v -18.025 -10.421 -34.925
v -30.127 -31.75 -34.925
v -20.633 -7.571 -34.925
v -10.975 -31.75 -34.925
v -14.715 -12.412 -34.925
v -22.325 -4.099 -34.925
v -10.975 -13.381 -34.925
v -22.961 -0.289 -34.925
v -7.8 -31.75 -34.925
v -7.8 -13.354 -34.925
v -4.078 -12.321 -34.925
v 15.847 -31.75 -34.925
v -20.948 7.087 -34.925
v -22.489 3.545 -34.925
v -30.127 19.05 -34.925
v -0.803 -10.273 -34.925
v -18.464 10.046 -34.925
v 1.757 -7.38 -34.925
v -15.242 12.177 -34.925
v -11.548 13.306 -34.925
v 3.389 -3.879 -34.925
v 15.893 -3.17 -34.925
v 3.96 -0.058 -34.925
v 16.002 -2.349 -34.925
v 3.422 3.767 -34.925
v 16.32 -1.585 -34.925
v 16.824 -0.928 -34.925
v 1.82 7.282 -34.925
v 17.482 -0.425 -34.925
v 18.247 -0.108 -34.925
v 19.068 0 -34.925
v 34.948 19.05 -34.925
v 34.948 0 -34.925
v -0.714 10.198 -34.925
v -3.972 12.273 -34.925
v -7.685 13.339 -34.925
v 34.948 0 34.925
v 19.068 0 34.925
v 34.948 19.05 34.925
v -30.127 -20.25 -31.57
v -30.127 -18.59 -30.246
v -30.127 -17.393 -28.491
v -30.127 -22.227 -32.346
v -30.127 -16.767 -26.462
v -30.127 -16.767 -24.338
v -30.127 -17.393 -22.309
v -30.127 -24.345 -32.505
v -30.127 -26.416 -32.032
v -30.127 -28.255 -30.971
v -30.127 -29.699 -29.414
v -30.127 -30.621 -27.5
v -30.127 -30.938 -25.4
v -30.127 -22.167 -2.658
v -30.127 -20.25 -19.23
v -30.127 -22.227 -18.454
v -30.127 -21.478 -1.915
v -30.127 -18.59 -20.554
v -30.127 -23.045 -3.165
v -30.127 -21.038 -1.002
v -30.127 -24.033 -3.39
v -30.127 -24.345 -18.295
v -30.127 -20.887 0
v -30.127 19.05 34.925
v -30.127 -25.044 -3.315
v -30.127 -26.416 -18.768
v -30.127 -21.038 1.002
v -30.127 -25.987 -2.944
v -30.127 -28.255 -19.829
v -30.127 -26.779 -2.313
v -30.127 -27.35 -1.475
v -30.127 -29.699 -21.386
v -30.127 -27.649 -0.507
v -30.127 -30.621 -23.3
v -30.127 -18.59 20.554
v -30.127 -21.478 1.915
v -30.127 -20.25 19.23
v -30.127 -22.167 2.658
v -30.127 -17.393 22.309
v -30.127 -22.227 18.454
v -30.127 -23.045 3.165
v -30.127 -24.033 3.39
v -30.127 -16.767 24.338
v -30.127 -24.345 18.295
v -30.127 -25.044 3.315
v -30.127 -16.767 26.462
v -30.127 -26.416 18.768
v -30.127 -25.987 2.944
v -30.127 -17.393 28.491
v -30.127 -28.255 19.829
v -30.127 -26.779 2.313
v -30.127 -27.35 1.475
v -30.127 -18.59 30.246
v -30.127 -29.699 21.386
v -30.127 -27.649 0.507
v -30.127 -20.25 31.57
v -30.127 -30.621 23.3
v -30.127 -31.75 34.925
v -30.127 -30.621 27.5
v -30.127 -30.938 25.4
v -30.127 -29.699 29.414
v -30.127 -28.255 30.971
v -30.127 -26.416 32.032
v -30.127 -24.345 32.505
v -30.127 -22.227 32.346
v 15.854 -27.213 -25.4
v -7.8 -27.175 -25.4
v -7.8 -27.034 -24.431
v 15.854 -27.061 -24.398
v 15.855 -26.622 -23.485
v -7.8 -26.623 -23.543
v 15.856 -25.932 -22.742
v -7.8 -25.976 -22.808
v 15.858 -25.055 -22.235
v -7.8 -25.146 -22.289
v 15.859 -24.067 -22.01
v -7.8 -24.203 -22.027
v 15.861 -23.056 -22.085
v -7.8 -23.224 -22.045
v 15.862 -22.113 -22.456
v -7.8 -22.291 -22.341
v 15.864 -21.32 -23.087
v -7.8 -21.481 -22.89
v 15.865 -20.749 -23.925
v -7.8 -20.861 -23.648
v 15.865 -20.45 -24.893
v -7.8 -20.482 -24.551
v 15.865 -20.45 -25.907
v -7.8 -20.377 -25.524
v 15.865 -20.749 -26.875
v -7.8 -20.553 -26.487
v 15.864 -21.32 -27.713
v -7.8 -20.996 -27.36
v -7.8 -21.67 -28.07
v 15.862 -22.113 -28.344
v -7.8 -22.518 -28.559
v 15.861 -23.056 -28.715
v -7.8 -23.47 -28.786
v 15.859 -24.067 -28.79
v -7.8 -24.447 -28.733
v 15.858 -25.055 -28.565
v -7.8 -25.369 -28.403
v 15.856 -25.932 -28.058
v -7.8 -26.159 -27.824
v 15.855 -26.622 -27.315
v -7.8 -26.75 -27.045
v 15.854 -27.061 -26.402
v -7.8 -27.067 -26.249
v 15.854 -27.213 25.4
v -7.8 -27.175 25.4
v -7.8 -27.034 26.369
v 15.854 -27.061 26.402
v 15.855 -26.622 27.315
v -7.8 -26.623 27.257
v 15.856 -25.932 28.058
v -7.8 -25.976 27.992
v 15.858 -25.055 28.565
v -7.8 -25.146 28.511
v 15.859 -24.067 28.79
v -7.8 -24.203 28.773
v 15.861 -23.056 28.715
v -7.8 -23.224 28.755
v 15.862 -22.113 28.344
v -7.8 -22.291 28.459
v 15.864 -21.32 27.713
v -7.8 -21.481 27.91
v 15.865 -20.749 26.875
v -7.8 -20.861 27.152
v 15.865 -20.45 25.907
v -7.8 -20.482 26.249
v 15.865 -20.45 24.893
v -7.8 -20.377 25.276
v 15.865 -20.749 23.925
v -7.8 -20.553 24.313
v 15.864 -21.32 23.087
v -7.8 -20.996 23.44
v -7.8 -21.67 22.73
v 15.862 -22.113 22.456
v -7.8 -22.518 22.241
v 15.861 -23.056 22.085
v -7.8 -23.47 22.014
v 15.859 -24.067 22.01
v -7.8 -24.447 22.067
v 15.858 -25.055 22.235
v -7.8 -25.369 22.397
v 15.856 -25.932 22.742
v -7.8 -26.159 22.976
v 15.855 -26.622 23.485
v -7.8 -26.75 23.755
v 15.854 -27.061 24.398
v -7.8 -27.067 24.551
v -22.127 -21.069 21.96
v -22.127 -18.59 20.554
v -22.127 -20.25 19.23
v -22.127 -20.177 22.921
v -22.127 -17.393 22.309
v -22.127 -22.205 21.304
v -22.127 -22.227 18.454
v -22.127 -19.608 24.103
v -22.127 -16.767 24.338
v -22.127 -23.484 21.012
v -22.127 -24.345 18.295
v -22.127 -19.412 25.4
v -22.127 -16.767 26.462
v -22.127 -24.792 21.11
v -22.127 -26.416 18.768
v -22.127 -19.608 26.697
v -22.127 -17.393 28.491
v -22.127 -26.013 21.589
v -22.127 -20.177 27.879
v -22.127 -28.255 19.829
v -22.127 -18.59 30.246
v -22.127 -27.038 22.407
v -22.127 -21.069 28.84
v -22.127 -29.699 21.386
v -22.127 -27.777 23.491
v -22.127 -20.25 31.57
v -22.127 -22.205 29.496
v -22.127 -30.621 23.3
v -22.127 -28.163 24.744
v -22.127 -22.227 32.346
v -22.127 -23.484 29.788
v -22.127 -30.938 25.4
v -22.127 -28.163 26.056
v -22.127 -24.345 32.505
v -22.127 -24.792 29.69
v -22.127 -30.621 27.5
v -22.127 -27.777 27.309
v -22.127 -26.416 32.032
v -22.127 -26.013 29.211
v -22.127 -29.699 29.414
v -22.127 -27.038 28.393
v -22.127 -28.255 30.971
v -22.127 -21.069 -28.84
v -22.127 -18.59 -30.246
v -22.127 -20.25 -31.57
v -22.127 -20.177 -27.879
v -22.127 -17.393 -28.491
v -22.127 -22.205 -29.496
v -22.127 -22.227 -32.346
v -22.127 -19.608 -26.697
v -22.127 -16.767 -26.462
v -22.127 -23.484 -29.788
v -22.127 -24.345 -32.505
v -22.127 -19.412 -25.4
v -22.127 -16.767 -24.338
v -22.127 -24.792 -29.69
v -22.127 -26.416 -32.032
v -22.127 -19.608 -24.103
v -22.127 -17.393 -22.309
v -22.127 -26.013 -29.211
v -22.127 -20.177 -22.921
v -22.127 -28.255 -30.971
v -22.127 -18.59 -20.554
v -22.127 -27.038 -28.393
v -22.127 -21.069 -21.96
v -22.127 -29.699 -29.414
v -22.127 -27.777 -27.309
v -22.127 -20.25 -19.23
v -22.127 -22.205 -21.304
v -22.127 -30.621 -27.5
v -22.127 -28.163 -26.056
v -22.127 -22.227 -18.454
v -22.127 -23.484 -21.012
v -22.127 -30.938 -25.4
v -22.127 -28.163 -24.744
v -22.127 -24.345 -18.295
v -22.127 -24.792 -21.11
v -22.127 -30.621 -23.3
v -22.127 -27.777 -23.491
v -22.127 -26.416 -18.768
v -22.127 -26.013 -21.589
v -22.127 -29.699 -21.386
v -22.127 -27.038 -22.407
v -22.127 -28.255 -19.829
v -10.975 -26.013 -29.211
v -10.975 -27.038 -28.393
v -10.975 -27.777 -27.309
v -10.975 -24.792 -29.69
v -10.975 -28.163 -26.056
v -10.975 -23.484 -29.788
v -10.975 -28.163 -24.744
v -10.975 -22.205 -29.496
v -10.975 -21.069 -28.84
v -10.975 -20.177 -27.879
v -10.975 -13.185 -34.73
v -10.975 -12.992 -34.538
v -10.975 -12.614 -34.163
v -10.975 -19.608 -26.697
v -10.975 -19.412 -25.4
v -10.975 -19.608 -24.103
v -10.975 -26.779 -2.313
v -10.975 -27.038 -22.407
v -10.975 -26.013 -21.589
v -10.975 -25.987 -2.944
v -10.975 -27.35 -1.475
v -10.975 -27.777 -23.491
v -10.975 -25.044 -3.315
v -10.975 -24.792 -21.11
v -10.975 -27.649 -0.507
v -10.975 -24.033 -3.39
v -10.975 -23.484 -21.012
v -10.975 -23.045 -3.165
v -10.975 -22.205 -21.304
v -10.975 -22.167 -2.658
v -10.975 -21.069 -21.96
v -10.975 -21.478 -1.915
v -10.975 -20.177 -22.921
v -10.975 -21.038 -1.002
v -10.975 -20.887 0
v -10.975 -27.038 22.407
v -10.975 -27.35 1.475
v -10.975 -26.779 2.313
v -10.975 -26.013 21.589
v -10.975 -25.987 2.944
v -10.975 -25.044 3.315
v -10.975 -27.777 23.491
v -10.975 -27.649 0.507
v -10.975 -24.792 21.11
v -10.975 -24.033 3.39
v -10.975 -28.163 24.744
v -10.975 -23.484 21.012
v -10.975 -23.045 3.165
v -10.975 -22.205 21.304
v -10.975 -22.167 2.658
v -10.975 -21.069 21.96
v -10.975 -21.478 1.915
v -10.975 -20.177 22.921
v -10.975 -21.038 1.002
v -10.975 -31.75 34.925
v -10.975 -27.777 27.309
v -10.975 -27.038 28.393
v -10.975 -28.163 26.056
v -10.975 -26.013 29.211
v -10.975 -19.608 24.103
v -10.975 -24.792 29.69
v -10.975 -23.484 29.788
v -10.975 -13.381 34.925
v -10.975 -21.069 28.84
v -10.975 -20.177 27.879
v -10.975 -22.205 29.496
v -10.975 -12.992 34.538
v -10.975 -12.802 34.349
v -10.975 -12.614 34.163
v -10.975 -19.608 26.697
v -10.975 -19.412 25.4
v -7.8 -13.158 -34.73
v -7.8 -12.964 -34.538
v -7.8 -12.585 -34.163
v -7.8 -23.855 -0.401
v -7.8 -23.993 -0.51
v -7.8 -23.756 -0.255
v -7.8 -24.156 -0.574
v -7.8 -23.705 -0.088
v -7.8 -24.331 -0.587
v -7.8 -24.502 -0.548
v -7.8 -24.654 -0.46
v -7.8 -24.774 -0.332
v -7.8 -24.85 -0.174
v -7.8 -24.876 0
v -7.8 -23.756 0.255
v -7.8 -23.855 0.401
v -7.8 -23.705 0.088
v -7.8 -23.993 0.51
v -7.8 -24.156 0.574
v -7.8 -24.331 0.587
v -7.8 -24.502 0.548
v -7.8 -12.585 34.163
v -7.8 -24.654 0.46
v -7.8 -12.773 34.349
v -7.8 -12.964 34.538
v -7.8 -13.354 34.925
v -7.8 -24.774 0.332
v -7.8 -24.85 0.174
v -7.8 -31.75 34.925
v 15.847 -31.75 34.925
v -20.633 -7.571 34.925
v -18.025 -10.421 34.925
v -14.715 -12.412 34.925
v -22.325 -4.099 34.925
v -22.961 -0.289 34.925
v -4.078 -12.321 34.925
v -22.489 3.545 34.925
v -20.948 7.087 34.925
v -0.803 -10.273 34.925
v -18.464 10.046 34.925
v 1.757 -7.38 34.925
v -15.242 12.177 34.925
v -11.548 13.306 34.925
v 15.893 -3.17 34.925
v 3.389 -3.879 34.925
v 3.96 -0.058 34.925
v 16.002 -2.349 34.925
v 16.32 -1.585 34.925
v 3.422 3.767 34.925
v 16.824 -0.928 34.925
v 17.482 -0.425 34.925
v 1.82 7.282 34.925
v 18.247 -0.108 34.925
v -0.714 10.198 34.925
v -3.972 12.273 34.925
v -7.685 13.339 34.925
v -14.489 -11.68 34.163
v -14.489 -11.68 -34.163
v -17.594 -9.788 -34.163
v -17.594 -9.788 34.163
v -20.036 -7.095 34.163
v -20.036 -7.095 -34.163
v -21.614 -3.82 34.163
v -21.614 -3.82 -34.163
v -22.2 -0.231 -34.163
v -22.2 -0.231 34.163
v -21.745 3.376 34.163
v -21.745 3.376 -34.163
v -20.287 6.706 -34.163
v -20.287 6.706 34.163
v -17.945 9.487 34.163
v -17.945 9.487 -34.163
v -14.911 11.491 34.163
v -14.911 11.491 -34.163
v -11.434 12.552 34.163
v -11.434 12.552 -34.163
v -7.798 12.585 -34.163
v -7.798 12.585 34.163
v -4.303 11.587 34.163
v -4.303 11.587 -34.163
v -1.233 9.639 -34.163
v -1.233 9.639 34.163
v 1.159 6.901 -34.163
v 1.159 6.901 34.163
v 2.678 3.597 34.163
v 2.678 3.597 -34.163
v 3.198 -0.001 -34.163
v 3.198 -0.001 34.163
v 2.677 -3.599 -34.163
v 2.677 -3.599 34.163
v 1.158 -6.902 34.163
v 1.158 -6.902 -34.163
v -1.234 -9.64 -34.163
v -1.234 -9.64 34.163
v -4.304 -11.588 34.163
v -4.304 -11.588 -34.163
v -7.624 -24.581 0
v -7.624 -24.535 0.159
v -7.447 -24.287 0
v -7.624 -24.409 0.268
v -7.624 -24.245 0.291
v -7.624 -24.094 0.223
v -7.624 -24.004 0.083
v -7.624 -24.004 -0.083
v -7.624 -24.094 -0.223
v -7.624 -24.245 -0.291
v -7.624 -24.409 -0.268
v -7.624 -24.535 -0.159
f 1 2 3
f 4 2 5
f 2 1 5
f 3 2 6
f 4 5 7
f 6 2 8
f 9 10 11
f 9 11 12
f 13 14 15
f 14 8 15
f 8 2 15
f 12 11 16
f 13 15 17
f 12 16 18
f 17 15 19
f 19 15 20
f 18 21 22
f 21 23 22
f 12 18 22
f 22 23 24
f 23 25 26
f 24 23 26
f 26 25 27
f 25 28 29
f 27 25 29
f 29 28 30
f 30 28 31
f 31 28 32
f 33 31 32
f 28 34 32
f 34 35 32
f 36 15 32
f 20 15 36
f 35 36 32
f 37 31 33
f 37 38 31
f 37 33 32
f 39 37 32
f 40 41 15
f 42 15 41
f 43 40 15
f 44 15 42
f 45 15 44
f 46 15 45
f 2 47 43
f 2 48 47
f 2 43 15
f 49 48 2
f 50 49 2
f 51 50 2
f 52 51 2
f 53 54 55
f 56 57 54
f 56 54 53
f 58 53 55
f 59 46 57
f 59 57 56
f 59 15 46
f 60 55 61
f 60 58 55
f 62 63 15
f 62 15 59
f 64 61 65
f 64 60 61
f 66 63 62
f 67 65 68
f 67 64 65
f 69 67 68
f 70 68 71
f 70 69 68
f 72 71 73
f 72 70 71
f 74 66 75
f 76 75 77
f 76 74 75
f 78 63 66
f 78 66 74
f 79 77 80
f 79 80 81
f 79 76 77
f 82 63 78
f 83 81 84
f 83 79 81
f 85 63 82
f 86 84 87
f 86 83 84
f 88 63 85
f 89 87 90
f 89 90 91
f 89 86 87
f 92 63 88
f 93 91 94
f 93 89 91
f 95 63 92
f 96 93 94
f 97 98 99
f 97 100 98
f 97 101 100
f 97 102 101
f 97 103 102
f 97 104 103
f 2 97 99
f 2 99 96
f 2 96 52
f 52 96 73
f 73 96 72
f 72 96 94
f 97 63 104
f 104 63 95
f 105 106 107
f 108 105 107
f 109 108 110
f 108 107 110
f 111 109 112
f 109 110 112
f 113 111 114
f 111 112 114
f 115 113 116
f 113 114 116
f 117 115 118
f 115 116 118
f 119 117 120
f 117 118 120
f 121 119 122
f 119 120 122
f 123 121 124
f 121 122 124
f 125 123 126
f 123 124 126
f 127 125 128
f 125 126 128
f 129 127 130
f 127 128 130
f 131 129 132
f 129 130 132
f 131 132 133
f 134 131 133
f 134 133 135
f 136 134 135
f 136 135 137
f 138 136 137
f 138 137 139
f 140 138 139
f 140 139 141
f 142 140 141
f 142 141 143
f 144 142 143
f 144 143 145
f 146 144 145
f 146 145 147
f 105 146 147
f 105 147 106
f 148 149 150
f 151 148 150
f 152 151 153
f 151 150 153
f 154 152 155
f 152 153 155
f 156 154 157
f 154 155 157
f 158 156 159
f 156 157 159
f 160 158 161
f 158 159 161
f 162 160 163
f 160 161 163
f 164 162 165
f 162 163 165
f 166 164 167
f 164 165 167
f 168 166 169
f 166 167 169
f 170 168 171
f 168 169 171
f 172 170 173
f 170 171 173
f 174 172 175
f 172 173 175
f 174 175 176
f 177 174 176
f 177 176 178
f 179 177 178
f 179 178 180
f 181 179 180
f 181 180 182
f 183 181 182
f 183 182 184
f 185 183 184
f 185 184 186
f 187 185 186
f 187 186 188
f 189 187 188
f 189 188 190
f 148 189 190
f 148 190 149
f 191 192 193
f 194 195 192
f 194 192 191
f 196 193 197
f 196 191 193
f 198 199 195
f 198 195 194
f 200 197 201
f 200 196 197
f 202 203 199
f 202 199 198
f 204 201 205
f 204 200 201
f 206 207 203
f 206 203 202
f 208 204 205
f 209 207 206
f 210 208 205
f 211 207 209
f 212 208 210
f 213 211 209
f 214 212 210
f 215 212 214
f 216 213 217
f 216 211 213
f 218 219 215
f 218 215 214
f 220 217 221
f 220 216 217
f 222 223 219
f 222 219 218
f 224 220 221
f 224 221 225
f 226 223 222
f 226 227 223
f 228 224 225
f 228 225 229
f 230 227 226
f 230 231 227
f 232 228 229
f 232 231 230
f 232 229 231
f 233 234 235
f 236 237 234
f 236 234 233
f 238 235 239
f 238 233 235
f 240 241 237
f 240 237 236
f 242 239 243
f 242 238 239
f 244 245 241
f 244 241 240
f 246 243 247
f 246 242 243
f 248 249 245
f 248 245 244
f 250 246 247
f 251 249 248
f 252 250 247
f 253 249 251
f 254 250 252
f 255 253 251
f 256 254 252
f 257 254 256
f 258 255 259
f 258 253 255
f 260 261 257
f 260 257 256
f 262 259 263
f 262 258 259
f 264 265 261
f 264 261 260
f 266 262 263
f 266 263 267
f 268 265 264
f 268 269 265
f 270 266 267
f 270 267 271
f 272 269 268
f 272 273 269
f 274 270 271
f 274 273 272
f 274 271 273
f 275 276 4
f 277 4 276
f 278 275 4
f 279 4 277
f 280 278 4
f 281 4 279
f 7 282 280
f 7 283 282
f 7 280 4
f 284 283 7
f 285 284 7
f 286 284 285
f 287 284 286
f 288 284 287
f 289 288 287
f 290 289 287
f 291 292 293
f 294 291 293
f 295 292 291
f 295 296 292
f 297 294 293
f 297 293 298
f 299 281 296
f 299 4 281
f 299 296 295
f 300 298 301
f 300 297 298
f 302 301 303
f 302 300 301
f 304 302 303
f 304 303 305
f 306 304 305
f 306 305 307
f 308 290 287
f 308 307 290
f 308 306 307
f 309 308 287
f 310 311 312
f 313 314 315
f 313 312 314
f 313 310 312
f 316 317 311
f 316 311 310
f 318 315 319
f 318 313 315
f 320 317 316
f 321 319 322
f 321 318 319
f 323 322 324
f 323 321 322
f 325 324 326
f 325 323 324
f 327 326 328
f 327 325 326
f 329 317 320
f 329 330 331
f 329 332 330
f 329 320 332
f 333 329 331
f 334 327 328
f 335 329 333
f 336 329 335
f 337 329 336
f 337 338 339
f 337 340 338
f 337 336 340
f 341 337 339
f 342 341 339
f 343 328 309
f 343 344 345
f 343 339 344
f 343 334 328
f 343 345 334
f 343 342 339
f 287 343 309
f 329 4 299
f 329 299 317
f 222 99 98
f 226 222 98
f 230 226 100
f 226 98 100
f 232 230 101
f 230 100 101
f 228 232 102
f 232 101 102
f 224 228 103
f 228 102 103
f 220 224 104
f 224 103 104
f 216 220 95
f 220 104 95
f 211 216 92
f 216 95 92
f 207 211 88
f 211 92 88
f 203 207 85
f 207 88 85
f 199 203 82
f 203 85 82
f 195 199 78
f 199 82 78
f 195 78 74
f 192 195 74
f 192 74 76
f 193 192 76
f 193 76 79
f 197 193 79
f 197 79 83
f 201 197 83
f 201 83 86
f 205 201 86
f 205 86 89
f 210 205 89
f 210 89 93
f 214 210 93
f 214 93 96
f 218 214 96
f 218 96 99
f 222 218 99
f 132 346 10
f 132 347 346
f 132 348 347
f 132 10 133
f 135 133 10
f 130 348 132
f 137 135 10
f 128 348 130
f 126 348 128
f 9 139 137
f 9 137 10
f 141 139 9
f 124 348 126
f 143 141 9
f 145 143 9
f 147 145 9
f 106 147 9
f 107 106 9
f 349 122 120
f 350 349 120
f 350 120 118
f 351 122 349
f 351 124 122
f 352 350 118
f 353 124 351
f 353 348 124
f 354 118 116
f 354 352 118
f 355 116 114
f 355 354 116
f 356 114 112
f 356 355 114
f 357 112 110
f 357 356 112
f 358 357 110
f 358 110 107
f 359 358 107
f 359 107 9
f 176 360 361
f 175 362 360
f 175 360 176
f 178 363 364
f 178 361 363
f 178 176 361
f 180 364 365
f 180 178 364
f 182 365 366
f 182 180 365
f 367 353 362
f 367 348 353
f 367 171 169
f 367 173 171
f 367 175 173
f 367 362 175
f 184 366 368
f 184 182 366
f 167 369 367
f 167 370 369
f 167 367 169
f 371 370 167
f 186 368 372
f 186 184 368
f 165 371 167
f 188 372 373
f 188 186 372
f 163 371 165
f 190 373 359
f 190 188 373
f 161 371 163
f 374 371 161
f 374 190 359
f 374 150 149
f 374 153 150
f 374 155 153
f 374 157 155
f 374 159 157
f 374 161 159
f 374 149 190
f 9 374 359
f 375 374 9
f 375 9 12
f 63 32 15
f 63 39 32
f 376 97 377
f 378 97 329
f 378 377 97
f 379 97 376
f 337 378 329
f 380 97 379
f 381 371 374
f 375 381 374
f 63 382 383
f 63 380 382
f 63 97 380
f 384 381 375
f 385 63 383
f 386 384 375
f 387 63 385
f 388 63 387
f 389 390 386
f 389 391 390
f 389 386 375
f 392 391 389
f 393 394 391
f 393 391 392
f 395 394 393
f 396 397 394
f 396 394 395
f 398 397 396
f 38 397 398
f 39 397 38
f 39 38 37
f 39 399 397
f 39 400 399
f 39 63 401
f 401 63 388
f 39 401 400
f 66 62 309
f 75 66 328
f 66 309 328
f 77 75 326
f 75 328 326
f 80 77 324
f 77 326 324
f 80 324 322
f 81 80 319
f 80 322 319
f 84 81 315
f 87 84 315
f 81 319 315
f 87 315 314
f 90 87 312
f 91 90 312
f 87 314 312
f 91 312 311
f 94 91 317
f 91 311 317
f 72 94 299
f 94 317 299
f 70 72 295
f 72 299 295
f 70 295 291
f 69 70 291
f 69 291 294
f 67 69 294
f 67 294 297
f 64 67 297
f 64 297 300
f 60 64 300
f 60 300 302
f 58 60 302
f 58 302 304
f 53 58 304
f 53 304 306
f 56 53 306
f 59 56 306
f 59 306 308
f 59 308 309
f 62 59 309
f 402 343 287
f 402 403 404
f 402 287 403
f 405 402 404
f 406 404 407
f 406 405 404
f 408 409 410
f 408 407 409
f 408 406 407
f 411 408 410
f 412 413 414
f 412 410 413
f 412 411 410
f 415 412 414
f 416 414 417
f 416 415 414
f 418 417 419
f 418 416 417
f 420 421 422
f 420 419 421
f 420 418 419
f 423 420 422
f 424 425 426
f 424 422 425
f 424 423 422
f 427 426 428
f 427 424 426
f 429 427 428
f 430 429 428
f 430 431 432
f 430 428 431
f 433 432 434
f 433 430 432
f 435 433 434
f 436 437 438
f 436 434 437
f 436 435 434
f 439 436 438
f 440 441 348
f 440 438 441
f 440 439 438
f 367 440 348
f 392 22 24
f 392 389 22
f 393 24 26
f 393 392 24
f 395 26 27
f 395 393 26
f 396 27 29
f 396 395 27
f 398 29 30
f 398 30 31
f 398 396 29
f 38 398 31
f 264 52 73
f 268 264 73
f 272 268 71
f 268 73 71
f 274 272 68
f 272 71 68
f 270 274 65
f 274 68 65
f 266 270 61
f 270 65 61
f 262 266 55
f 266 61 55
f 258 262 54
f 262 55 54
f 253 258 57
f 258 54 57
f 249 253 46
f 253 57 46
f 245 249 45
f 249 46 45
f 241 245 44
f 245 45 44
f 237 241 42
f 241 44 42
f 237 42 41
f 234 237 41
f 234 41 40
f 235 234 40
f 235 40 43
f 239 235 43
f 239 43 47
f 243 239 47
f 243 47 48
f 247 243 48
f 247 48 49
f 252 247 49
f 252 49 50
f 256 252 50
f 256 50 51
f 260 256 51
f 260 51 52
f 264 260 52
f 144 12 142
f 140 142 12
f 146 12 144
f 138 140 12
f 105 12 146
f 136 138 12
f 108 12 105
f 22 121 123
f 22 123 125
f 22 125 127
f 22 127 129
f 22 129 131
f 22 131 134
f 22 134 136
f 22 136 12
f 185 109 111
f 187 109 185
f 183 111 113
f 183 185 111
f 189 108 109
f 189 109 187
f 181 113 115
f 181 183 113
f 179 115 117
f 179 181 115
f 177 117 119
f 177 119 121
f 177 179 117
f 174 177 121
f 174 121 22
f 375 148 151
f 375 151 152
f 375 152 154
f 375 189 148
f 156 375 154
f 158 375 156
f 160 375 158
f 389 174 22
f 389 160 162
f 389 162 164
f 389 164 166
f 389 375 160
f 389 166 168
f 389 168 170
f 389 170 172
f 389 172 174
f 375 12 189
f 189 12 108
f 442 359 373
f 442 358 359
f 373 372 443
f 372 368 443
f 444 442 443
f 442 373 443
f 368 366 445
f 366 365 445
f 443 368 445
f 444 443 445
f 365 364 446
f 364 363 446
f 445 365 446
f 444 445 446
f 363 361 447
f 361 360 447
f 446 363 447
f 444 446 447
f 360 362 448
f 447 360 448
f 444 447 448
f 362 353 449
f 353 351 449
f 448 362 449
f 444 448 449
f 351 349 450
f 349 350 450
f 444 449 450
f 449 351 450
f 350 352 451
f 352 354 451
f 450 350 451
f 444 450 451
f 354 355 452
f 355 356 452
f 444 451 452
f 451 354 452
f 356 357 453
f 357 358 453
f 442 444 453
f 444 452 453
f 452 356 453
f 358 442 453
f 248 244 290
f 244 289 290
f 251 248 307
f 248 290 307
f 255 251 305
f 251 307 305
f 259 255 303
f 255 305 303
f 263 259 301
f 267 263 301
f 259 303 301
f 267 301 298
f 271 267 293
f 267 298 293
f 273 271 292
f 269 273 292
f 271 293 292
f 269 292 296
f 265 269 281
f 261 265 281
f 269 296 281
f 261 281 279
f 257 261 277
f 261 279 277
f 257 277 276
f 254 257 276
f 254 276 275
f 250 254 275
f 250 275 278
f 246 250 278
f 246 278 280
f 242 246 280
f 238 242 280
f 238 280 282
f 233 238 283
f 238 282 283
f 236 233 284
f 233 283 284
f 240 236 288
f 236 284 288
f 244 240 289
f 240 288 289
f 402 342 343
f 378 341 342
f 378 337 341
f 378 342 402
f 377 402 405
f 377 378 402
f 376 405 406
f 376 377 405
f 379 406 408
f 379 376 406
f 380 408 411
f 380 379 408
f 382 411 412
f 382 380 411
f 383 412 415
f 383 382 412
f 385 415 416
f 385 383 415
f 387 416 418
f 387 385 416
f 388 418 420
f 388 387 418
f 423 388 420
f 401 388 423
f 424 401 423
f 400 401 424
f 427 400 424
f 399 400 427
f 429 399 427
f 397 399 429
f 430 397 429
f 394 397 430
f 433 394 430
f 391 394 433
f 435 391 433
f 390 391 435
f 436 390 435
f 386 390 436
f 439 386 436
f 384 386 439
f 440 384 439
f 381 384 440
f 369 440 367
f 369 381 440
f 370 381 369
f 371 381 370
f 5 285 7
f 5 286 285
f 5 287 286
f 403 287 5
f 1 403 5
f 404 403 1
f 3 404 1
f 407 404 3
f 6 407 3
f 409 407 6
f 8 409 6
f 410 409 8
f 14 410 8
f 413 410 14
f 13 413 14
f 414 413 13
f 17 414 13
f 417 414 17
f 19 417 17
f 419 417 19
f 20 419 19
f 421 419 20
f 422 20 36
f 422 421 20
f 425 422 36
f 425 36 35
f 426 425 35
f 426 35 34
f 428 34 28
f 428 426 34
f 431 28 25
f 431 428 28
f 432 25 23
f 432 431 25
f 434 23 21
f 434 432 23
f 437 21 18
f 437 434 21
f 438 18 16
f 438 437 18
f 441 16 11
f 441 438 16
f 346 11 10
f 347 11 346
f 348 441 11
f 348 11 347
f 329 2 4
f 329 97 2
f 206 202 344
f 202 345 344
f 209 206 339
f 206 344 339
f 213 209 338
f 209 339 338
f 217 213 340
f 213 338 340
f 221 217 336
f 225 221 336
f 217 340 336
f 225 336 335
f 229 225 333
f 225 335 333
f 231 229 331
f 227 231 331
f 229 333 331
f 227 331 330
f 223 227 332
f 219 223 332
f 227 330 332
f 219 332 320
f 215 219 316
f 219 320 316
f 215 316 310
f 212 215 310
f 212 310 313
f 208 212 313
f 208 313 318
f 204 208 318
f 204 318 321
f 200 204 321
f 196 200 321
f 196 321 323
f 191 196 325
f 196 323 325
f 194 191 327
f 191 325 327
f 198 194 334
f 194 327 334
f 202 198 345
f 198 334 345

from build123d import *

# Parameters (mm, degrees)
F1_DEPTH       = 34.925
F3_D           = 8.8
F3_DEPTH       = 20.6375
F3_CBORE_D     = 14.25
F3_CBORE_DEPTH = 8
F3_TIP         = 2.6437867237
F5_D           = 6.8
F5_DEPTH       = 20.6375
F5_TIP         = 2.0429261047
F6_R           = 3.175
F7_SIZE        = 0.762
F9_D           = 6.8


# Not quite as in the source:
# - ends of sketch curves that miss each other by under 0.0002 mm in the source are joined


with BuildPart() as f1:
    # F0 (on Top) → F1 (new body, symmetric)
    with BuildSketch(Plane.XY):
        with BuildLine():
            Line((-30.1270424985, 1.5875), (-30.1270424985, -31.75))
            Line((-30.1270424985, -31.75), (-15.6690329313, -31.75))
            Line((-15.6690329313, -31.75), (-10.9754424985, -31.75))
            Line((-10.9754424985, -31.75), (-10.9754424985, -12.6142650107))
            ThreePointArc((-10.9754424985, -12.6142650107), (-19.4991930627, -7.8326866028), (-22.1026331175, 1.5875))
            ThreePointArc((-22.1026331175, 1.5875), (-0.5628331886, 9.0209179793), (-7.8004424985, -12.585462914))
            Line((-7.8004424985, -12.585462914), (-7.8004424985, -31.75))
            Line((-7.8004424985, -31.75), (15.8469575015, -31.75))
            Line((15.8469575015, -31.75), (15.8977575015, 0))
            Line((15.8977575015, 0), (34.9477575015, 0))
            Line((34.9477575015, 0), (34.9477575015, 19.05))
            Line((34.9477575015, 19.05), (-30.1270424985, 19.05))
            Line((-30.1270424985, 19.05), (-30.1270424985, 1.5875))
        make_face()
    extrude(amount=F1_DEPTH, both=True)

    # F3
    with Locations(Plane(origin=(-30.1270424985, 0, 0), x_dir=(0, -1, 0), z_dir=(-1, 0, 0))):
        with Locations((23.8125, 25.4), (23.8125, -25.4)):
            CounterBoreHole(F3_D / 2, F3_CBORE_D / 2, F3_CBORE_DEPTH, depth=F3_DEPTH)
            with Locations((0, 0, -(F3_DEPTH + F3_TIP / 2))):  # 118° drill point
                Cone(0, F3_D / 2, F3_TIP, mode=Mode.SUBTRACT)

    # F5
    with Locations(Plane(origin=(-30.1270424985, 0, 0), x_dir=(0, -1, 0), z_dir=(-1, 0, 0))):
        with Locations((24.2870002985, 0)):
            Hole(F5_D / 2, depth=F5_DEPTH)
            with Locations((0, 0, -(F5_DEPTH + F5_TIP / 2))):  # 118° drill point
                Cone(0, F5_D / 2, F5_TIP, mode=Mode.SUBTRACT)

    # F6
    f6_edges = [f1.edges().sort_by_distance(p)[0] for p in [
        (15.897758, 0, 0),
    ]]
    fillet(f6_edges, radius=F6_R)

    # F7
    f7_edges = [f1.edges().sort_by_distance(p)[0] for p in [
        (-9.617446, 12.699477, 34.925),
        (-9.617446, 12.699477, -34.925),
    ]]
    chamfer(f7_edges, length=F7_SIZE)

    # F9 (through all)
    with Locations(Plane(origin=(15.8977168033, -0.0254363469, 0), x_dir=(0.001599998, 0.99999872, 0), z_dir=(0.99999872, -0.001599998, 0))):
        with Locations((-23.7871042605, 25.4), (-23.7871042605, -25.4)):
            Hole(F9_D / 2)


solid = f1.part
